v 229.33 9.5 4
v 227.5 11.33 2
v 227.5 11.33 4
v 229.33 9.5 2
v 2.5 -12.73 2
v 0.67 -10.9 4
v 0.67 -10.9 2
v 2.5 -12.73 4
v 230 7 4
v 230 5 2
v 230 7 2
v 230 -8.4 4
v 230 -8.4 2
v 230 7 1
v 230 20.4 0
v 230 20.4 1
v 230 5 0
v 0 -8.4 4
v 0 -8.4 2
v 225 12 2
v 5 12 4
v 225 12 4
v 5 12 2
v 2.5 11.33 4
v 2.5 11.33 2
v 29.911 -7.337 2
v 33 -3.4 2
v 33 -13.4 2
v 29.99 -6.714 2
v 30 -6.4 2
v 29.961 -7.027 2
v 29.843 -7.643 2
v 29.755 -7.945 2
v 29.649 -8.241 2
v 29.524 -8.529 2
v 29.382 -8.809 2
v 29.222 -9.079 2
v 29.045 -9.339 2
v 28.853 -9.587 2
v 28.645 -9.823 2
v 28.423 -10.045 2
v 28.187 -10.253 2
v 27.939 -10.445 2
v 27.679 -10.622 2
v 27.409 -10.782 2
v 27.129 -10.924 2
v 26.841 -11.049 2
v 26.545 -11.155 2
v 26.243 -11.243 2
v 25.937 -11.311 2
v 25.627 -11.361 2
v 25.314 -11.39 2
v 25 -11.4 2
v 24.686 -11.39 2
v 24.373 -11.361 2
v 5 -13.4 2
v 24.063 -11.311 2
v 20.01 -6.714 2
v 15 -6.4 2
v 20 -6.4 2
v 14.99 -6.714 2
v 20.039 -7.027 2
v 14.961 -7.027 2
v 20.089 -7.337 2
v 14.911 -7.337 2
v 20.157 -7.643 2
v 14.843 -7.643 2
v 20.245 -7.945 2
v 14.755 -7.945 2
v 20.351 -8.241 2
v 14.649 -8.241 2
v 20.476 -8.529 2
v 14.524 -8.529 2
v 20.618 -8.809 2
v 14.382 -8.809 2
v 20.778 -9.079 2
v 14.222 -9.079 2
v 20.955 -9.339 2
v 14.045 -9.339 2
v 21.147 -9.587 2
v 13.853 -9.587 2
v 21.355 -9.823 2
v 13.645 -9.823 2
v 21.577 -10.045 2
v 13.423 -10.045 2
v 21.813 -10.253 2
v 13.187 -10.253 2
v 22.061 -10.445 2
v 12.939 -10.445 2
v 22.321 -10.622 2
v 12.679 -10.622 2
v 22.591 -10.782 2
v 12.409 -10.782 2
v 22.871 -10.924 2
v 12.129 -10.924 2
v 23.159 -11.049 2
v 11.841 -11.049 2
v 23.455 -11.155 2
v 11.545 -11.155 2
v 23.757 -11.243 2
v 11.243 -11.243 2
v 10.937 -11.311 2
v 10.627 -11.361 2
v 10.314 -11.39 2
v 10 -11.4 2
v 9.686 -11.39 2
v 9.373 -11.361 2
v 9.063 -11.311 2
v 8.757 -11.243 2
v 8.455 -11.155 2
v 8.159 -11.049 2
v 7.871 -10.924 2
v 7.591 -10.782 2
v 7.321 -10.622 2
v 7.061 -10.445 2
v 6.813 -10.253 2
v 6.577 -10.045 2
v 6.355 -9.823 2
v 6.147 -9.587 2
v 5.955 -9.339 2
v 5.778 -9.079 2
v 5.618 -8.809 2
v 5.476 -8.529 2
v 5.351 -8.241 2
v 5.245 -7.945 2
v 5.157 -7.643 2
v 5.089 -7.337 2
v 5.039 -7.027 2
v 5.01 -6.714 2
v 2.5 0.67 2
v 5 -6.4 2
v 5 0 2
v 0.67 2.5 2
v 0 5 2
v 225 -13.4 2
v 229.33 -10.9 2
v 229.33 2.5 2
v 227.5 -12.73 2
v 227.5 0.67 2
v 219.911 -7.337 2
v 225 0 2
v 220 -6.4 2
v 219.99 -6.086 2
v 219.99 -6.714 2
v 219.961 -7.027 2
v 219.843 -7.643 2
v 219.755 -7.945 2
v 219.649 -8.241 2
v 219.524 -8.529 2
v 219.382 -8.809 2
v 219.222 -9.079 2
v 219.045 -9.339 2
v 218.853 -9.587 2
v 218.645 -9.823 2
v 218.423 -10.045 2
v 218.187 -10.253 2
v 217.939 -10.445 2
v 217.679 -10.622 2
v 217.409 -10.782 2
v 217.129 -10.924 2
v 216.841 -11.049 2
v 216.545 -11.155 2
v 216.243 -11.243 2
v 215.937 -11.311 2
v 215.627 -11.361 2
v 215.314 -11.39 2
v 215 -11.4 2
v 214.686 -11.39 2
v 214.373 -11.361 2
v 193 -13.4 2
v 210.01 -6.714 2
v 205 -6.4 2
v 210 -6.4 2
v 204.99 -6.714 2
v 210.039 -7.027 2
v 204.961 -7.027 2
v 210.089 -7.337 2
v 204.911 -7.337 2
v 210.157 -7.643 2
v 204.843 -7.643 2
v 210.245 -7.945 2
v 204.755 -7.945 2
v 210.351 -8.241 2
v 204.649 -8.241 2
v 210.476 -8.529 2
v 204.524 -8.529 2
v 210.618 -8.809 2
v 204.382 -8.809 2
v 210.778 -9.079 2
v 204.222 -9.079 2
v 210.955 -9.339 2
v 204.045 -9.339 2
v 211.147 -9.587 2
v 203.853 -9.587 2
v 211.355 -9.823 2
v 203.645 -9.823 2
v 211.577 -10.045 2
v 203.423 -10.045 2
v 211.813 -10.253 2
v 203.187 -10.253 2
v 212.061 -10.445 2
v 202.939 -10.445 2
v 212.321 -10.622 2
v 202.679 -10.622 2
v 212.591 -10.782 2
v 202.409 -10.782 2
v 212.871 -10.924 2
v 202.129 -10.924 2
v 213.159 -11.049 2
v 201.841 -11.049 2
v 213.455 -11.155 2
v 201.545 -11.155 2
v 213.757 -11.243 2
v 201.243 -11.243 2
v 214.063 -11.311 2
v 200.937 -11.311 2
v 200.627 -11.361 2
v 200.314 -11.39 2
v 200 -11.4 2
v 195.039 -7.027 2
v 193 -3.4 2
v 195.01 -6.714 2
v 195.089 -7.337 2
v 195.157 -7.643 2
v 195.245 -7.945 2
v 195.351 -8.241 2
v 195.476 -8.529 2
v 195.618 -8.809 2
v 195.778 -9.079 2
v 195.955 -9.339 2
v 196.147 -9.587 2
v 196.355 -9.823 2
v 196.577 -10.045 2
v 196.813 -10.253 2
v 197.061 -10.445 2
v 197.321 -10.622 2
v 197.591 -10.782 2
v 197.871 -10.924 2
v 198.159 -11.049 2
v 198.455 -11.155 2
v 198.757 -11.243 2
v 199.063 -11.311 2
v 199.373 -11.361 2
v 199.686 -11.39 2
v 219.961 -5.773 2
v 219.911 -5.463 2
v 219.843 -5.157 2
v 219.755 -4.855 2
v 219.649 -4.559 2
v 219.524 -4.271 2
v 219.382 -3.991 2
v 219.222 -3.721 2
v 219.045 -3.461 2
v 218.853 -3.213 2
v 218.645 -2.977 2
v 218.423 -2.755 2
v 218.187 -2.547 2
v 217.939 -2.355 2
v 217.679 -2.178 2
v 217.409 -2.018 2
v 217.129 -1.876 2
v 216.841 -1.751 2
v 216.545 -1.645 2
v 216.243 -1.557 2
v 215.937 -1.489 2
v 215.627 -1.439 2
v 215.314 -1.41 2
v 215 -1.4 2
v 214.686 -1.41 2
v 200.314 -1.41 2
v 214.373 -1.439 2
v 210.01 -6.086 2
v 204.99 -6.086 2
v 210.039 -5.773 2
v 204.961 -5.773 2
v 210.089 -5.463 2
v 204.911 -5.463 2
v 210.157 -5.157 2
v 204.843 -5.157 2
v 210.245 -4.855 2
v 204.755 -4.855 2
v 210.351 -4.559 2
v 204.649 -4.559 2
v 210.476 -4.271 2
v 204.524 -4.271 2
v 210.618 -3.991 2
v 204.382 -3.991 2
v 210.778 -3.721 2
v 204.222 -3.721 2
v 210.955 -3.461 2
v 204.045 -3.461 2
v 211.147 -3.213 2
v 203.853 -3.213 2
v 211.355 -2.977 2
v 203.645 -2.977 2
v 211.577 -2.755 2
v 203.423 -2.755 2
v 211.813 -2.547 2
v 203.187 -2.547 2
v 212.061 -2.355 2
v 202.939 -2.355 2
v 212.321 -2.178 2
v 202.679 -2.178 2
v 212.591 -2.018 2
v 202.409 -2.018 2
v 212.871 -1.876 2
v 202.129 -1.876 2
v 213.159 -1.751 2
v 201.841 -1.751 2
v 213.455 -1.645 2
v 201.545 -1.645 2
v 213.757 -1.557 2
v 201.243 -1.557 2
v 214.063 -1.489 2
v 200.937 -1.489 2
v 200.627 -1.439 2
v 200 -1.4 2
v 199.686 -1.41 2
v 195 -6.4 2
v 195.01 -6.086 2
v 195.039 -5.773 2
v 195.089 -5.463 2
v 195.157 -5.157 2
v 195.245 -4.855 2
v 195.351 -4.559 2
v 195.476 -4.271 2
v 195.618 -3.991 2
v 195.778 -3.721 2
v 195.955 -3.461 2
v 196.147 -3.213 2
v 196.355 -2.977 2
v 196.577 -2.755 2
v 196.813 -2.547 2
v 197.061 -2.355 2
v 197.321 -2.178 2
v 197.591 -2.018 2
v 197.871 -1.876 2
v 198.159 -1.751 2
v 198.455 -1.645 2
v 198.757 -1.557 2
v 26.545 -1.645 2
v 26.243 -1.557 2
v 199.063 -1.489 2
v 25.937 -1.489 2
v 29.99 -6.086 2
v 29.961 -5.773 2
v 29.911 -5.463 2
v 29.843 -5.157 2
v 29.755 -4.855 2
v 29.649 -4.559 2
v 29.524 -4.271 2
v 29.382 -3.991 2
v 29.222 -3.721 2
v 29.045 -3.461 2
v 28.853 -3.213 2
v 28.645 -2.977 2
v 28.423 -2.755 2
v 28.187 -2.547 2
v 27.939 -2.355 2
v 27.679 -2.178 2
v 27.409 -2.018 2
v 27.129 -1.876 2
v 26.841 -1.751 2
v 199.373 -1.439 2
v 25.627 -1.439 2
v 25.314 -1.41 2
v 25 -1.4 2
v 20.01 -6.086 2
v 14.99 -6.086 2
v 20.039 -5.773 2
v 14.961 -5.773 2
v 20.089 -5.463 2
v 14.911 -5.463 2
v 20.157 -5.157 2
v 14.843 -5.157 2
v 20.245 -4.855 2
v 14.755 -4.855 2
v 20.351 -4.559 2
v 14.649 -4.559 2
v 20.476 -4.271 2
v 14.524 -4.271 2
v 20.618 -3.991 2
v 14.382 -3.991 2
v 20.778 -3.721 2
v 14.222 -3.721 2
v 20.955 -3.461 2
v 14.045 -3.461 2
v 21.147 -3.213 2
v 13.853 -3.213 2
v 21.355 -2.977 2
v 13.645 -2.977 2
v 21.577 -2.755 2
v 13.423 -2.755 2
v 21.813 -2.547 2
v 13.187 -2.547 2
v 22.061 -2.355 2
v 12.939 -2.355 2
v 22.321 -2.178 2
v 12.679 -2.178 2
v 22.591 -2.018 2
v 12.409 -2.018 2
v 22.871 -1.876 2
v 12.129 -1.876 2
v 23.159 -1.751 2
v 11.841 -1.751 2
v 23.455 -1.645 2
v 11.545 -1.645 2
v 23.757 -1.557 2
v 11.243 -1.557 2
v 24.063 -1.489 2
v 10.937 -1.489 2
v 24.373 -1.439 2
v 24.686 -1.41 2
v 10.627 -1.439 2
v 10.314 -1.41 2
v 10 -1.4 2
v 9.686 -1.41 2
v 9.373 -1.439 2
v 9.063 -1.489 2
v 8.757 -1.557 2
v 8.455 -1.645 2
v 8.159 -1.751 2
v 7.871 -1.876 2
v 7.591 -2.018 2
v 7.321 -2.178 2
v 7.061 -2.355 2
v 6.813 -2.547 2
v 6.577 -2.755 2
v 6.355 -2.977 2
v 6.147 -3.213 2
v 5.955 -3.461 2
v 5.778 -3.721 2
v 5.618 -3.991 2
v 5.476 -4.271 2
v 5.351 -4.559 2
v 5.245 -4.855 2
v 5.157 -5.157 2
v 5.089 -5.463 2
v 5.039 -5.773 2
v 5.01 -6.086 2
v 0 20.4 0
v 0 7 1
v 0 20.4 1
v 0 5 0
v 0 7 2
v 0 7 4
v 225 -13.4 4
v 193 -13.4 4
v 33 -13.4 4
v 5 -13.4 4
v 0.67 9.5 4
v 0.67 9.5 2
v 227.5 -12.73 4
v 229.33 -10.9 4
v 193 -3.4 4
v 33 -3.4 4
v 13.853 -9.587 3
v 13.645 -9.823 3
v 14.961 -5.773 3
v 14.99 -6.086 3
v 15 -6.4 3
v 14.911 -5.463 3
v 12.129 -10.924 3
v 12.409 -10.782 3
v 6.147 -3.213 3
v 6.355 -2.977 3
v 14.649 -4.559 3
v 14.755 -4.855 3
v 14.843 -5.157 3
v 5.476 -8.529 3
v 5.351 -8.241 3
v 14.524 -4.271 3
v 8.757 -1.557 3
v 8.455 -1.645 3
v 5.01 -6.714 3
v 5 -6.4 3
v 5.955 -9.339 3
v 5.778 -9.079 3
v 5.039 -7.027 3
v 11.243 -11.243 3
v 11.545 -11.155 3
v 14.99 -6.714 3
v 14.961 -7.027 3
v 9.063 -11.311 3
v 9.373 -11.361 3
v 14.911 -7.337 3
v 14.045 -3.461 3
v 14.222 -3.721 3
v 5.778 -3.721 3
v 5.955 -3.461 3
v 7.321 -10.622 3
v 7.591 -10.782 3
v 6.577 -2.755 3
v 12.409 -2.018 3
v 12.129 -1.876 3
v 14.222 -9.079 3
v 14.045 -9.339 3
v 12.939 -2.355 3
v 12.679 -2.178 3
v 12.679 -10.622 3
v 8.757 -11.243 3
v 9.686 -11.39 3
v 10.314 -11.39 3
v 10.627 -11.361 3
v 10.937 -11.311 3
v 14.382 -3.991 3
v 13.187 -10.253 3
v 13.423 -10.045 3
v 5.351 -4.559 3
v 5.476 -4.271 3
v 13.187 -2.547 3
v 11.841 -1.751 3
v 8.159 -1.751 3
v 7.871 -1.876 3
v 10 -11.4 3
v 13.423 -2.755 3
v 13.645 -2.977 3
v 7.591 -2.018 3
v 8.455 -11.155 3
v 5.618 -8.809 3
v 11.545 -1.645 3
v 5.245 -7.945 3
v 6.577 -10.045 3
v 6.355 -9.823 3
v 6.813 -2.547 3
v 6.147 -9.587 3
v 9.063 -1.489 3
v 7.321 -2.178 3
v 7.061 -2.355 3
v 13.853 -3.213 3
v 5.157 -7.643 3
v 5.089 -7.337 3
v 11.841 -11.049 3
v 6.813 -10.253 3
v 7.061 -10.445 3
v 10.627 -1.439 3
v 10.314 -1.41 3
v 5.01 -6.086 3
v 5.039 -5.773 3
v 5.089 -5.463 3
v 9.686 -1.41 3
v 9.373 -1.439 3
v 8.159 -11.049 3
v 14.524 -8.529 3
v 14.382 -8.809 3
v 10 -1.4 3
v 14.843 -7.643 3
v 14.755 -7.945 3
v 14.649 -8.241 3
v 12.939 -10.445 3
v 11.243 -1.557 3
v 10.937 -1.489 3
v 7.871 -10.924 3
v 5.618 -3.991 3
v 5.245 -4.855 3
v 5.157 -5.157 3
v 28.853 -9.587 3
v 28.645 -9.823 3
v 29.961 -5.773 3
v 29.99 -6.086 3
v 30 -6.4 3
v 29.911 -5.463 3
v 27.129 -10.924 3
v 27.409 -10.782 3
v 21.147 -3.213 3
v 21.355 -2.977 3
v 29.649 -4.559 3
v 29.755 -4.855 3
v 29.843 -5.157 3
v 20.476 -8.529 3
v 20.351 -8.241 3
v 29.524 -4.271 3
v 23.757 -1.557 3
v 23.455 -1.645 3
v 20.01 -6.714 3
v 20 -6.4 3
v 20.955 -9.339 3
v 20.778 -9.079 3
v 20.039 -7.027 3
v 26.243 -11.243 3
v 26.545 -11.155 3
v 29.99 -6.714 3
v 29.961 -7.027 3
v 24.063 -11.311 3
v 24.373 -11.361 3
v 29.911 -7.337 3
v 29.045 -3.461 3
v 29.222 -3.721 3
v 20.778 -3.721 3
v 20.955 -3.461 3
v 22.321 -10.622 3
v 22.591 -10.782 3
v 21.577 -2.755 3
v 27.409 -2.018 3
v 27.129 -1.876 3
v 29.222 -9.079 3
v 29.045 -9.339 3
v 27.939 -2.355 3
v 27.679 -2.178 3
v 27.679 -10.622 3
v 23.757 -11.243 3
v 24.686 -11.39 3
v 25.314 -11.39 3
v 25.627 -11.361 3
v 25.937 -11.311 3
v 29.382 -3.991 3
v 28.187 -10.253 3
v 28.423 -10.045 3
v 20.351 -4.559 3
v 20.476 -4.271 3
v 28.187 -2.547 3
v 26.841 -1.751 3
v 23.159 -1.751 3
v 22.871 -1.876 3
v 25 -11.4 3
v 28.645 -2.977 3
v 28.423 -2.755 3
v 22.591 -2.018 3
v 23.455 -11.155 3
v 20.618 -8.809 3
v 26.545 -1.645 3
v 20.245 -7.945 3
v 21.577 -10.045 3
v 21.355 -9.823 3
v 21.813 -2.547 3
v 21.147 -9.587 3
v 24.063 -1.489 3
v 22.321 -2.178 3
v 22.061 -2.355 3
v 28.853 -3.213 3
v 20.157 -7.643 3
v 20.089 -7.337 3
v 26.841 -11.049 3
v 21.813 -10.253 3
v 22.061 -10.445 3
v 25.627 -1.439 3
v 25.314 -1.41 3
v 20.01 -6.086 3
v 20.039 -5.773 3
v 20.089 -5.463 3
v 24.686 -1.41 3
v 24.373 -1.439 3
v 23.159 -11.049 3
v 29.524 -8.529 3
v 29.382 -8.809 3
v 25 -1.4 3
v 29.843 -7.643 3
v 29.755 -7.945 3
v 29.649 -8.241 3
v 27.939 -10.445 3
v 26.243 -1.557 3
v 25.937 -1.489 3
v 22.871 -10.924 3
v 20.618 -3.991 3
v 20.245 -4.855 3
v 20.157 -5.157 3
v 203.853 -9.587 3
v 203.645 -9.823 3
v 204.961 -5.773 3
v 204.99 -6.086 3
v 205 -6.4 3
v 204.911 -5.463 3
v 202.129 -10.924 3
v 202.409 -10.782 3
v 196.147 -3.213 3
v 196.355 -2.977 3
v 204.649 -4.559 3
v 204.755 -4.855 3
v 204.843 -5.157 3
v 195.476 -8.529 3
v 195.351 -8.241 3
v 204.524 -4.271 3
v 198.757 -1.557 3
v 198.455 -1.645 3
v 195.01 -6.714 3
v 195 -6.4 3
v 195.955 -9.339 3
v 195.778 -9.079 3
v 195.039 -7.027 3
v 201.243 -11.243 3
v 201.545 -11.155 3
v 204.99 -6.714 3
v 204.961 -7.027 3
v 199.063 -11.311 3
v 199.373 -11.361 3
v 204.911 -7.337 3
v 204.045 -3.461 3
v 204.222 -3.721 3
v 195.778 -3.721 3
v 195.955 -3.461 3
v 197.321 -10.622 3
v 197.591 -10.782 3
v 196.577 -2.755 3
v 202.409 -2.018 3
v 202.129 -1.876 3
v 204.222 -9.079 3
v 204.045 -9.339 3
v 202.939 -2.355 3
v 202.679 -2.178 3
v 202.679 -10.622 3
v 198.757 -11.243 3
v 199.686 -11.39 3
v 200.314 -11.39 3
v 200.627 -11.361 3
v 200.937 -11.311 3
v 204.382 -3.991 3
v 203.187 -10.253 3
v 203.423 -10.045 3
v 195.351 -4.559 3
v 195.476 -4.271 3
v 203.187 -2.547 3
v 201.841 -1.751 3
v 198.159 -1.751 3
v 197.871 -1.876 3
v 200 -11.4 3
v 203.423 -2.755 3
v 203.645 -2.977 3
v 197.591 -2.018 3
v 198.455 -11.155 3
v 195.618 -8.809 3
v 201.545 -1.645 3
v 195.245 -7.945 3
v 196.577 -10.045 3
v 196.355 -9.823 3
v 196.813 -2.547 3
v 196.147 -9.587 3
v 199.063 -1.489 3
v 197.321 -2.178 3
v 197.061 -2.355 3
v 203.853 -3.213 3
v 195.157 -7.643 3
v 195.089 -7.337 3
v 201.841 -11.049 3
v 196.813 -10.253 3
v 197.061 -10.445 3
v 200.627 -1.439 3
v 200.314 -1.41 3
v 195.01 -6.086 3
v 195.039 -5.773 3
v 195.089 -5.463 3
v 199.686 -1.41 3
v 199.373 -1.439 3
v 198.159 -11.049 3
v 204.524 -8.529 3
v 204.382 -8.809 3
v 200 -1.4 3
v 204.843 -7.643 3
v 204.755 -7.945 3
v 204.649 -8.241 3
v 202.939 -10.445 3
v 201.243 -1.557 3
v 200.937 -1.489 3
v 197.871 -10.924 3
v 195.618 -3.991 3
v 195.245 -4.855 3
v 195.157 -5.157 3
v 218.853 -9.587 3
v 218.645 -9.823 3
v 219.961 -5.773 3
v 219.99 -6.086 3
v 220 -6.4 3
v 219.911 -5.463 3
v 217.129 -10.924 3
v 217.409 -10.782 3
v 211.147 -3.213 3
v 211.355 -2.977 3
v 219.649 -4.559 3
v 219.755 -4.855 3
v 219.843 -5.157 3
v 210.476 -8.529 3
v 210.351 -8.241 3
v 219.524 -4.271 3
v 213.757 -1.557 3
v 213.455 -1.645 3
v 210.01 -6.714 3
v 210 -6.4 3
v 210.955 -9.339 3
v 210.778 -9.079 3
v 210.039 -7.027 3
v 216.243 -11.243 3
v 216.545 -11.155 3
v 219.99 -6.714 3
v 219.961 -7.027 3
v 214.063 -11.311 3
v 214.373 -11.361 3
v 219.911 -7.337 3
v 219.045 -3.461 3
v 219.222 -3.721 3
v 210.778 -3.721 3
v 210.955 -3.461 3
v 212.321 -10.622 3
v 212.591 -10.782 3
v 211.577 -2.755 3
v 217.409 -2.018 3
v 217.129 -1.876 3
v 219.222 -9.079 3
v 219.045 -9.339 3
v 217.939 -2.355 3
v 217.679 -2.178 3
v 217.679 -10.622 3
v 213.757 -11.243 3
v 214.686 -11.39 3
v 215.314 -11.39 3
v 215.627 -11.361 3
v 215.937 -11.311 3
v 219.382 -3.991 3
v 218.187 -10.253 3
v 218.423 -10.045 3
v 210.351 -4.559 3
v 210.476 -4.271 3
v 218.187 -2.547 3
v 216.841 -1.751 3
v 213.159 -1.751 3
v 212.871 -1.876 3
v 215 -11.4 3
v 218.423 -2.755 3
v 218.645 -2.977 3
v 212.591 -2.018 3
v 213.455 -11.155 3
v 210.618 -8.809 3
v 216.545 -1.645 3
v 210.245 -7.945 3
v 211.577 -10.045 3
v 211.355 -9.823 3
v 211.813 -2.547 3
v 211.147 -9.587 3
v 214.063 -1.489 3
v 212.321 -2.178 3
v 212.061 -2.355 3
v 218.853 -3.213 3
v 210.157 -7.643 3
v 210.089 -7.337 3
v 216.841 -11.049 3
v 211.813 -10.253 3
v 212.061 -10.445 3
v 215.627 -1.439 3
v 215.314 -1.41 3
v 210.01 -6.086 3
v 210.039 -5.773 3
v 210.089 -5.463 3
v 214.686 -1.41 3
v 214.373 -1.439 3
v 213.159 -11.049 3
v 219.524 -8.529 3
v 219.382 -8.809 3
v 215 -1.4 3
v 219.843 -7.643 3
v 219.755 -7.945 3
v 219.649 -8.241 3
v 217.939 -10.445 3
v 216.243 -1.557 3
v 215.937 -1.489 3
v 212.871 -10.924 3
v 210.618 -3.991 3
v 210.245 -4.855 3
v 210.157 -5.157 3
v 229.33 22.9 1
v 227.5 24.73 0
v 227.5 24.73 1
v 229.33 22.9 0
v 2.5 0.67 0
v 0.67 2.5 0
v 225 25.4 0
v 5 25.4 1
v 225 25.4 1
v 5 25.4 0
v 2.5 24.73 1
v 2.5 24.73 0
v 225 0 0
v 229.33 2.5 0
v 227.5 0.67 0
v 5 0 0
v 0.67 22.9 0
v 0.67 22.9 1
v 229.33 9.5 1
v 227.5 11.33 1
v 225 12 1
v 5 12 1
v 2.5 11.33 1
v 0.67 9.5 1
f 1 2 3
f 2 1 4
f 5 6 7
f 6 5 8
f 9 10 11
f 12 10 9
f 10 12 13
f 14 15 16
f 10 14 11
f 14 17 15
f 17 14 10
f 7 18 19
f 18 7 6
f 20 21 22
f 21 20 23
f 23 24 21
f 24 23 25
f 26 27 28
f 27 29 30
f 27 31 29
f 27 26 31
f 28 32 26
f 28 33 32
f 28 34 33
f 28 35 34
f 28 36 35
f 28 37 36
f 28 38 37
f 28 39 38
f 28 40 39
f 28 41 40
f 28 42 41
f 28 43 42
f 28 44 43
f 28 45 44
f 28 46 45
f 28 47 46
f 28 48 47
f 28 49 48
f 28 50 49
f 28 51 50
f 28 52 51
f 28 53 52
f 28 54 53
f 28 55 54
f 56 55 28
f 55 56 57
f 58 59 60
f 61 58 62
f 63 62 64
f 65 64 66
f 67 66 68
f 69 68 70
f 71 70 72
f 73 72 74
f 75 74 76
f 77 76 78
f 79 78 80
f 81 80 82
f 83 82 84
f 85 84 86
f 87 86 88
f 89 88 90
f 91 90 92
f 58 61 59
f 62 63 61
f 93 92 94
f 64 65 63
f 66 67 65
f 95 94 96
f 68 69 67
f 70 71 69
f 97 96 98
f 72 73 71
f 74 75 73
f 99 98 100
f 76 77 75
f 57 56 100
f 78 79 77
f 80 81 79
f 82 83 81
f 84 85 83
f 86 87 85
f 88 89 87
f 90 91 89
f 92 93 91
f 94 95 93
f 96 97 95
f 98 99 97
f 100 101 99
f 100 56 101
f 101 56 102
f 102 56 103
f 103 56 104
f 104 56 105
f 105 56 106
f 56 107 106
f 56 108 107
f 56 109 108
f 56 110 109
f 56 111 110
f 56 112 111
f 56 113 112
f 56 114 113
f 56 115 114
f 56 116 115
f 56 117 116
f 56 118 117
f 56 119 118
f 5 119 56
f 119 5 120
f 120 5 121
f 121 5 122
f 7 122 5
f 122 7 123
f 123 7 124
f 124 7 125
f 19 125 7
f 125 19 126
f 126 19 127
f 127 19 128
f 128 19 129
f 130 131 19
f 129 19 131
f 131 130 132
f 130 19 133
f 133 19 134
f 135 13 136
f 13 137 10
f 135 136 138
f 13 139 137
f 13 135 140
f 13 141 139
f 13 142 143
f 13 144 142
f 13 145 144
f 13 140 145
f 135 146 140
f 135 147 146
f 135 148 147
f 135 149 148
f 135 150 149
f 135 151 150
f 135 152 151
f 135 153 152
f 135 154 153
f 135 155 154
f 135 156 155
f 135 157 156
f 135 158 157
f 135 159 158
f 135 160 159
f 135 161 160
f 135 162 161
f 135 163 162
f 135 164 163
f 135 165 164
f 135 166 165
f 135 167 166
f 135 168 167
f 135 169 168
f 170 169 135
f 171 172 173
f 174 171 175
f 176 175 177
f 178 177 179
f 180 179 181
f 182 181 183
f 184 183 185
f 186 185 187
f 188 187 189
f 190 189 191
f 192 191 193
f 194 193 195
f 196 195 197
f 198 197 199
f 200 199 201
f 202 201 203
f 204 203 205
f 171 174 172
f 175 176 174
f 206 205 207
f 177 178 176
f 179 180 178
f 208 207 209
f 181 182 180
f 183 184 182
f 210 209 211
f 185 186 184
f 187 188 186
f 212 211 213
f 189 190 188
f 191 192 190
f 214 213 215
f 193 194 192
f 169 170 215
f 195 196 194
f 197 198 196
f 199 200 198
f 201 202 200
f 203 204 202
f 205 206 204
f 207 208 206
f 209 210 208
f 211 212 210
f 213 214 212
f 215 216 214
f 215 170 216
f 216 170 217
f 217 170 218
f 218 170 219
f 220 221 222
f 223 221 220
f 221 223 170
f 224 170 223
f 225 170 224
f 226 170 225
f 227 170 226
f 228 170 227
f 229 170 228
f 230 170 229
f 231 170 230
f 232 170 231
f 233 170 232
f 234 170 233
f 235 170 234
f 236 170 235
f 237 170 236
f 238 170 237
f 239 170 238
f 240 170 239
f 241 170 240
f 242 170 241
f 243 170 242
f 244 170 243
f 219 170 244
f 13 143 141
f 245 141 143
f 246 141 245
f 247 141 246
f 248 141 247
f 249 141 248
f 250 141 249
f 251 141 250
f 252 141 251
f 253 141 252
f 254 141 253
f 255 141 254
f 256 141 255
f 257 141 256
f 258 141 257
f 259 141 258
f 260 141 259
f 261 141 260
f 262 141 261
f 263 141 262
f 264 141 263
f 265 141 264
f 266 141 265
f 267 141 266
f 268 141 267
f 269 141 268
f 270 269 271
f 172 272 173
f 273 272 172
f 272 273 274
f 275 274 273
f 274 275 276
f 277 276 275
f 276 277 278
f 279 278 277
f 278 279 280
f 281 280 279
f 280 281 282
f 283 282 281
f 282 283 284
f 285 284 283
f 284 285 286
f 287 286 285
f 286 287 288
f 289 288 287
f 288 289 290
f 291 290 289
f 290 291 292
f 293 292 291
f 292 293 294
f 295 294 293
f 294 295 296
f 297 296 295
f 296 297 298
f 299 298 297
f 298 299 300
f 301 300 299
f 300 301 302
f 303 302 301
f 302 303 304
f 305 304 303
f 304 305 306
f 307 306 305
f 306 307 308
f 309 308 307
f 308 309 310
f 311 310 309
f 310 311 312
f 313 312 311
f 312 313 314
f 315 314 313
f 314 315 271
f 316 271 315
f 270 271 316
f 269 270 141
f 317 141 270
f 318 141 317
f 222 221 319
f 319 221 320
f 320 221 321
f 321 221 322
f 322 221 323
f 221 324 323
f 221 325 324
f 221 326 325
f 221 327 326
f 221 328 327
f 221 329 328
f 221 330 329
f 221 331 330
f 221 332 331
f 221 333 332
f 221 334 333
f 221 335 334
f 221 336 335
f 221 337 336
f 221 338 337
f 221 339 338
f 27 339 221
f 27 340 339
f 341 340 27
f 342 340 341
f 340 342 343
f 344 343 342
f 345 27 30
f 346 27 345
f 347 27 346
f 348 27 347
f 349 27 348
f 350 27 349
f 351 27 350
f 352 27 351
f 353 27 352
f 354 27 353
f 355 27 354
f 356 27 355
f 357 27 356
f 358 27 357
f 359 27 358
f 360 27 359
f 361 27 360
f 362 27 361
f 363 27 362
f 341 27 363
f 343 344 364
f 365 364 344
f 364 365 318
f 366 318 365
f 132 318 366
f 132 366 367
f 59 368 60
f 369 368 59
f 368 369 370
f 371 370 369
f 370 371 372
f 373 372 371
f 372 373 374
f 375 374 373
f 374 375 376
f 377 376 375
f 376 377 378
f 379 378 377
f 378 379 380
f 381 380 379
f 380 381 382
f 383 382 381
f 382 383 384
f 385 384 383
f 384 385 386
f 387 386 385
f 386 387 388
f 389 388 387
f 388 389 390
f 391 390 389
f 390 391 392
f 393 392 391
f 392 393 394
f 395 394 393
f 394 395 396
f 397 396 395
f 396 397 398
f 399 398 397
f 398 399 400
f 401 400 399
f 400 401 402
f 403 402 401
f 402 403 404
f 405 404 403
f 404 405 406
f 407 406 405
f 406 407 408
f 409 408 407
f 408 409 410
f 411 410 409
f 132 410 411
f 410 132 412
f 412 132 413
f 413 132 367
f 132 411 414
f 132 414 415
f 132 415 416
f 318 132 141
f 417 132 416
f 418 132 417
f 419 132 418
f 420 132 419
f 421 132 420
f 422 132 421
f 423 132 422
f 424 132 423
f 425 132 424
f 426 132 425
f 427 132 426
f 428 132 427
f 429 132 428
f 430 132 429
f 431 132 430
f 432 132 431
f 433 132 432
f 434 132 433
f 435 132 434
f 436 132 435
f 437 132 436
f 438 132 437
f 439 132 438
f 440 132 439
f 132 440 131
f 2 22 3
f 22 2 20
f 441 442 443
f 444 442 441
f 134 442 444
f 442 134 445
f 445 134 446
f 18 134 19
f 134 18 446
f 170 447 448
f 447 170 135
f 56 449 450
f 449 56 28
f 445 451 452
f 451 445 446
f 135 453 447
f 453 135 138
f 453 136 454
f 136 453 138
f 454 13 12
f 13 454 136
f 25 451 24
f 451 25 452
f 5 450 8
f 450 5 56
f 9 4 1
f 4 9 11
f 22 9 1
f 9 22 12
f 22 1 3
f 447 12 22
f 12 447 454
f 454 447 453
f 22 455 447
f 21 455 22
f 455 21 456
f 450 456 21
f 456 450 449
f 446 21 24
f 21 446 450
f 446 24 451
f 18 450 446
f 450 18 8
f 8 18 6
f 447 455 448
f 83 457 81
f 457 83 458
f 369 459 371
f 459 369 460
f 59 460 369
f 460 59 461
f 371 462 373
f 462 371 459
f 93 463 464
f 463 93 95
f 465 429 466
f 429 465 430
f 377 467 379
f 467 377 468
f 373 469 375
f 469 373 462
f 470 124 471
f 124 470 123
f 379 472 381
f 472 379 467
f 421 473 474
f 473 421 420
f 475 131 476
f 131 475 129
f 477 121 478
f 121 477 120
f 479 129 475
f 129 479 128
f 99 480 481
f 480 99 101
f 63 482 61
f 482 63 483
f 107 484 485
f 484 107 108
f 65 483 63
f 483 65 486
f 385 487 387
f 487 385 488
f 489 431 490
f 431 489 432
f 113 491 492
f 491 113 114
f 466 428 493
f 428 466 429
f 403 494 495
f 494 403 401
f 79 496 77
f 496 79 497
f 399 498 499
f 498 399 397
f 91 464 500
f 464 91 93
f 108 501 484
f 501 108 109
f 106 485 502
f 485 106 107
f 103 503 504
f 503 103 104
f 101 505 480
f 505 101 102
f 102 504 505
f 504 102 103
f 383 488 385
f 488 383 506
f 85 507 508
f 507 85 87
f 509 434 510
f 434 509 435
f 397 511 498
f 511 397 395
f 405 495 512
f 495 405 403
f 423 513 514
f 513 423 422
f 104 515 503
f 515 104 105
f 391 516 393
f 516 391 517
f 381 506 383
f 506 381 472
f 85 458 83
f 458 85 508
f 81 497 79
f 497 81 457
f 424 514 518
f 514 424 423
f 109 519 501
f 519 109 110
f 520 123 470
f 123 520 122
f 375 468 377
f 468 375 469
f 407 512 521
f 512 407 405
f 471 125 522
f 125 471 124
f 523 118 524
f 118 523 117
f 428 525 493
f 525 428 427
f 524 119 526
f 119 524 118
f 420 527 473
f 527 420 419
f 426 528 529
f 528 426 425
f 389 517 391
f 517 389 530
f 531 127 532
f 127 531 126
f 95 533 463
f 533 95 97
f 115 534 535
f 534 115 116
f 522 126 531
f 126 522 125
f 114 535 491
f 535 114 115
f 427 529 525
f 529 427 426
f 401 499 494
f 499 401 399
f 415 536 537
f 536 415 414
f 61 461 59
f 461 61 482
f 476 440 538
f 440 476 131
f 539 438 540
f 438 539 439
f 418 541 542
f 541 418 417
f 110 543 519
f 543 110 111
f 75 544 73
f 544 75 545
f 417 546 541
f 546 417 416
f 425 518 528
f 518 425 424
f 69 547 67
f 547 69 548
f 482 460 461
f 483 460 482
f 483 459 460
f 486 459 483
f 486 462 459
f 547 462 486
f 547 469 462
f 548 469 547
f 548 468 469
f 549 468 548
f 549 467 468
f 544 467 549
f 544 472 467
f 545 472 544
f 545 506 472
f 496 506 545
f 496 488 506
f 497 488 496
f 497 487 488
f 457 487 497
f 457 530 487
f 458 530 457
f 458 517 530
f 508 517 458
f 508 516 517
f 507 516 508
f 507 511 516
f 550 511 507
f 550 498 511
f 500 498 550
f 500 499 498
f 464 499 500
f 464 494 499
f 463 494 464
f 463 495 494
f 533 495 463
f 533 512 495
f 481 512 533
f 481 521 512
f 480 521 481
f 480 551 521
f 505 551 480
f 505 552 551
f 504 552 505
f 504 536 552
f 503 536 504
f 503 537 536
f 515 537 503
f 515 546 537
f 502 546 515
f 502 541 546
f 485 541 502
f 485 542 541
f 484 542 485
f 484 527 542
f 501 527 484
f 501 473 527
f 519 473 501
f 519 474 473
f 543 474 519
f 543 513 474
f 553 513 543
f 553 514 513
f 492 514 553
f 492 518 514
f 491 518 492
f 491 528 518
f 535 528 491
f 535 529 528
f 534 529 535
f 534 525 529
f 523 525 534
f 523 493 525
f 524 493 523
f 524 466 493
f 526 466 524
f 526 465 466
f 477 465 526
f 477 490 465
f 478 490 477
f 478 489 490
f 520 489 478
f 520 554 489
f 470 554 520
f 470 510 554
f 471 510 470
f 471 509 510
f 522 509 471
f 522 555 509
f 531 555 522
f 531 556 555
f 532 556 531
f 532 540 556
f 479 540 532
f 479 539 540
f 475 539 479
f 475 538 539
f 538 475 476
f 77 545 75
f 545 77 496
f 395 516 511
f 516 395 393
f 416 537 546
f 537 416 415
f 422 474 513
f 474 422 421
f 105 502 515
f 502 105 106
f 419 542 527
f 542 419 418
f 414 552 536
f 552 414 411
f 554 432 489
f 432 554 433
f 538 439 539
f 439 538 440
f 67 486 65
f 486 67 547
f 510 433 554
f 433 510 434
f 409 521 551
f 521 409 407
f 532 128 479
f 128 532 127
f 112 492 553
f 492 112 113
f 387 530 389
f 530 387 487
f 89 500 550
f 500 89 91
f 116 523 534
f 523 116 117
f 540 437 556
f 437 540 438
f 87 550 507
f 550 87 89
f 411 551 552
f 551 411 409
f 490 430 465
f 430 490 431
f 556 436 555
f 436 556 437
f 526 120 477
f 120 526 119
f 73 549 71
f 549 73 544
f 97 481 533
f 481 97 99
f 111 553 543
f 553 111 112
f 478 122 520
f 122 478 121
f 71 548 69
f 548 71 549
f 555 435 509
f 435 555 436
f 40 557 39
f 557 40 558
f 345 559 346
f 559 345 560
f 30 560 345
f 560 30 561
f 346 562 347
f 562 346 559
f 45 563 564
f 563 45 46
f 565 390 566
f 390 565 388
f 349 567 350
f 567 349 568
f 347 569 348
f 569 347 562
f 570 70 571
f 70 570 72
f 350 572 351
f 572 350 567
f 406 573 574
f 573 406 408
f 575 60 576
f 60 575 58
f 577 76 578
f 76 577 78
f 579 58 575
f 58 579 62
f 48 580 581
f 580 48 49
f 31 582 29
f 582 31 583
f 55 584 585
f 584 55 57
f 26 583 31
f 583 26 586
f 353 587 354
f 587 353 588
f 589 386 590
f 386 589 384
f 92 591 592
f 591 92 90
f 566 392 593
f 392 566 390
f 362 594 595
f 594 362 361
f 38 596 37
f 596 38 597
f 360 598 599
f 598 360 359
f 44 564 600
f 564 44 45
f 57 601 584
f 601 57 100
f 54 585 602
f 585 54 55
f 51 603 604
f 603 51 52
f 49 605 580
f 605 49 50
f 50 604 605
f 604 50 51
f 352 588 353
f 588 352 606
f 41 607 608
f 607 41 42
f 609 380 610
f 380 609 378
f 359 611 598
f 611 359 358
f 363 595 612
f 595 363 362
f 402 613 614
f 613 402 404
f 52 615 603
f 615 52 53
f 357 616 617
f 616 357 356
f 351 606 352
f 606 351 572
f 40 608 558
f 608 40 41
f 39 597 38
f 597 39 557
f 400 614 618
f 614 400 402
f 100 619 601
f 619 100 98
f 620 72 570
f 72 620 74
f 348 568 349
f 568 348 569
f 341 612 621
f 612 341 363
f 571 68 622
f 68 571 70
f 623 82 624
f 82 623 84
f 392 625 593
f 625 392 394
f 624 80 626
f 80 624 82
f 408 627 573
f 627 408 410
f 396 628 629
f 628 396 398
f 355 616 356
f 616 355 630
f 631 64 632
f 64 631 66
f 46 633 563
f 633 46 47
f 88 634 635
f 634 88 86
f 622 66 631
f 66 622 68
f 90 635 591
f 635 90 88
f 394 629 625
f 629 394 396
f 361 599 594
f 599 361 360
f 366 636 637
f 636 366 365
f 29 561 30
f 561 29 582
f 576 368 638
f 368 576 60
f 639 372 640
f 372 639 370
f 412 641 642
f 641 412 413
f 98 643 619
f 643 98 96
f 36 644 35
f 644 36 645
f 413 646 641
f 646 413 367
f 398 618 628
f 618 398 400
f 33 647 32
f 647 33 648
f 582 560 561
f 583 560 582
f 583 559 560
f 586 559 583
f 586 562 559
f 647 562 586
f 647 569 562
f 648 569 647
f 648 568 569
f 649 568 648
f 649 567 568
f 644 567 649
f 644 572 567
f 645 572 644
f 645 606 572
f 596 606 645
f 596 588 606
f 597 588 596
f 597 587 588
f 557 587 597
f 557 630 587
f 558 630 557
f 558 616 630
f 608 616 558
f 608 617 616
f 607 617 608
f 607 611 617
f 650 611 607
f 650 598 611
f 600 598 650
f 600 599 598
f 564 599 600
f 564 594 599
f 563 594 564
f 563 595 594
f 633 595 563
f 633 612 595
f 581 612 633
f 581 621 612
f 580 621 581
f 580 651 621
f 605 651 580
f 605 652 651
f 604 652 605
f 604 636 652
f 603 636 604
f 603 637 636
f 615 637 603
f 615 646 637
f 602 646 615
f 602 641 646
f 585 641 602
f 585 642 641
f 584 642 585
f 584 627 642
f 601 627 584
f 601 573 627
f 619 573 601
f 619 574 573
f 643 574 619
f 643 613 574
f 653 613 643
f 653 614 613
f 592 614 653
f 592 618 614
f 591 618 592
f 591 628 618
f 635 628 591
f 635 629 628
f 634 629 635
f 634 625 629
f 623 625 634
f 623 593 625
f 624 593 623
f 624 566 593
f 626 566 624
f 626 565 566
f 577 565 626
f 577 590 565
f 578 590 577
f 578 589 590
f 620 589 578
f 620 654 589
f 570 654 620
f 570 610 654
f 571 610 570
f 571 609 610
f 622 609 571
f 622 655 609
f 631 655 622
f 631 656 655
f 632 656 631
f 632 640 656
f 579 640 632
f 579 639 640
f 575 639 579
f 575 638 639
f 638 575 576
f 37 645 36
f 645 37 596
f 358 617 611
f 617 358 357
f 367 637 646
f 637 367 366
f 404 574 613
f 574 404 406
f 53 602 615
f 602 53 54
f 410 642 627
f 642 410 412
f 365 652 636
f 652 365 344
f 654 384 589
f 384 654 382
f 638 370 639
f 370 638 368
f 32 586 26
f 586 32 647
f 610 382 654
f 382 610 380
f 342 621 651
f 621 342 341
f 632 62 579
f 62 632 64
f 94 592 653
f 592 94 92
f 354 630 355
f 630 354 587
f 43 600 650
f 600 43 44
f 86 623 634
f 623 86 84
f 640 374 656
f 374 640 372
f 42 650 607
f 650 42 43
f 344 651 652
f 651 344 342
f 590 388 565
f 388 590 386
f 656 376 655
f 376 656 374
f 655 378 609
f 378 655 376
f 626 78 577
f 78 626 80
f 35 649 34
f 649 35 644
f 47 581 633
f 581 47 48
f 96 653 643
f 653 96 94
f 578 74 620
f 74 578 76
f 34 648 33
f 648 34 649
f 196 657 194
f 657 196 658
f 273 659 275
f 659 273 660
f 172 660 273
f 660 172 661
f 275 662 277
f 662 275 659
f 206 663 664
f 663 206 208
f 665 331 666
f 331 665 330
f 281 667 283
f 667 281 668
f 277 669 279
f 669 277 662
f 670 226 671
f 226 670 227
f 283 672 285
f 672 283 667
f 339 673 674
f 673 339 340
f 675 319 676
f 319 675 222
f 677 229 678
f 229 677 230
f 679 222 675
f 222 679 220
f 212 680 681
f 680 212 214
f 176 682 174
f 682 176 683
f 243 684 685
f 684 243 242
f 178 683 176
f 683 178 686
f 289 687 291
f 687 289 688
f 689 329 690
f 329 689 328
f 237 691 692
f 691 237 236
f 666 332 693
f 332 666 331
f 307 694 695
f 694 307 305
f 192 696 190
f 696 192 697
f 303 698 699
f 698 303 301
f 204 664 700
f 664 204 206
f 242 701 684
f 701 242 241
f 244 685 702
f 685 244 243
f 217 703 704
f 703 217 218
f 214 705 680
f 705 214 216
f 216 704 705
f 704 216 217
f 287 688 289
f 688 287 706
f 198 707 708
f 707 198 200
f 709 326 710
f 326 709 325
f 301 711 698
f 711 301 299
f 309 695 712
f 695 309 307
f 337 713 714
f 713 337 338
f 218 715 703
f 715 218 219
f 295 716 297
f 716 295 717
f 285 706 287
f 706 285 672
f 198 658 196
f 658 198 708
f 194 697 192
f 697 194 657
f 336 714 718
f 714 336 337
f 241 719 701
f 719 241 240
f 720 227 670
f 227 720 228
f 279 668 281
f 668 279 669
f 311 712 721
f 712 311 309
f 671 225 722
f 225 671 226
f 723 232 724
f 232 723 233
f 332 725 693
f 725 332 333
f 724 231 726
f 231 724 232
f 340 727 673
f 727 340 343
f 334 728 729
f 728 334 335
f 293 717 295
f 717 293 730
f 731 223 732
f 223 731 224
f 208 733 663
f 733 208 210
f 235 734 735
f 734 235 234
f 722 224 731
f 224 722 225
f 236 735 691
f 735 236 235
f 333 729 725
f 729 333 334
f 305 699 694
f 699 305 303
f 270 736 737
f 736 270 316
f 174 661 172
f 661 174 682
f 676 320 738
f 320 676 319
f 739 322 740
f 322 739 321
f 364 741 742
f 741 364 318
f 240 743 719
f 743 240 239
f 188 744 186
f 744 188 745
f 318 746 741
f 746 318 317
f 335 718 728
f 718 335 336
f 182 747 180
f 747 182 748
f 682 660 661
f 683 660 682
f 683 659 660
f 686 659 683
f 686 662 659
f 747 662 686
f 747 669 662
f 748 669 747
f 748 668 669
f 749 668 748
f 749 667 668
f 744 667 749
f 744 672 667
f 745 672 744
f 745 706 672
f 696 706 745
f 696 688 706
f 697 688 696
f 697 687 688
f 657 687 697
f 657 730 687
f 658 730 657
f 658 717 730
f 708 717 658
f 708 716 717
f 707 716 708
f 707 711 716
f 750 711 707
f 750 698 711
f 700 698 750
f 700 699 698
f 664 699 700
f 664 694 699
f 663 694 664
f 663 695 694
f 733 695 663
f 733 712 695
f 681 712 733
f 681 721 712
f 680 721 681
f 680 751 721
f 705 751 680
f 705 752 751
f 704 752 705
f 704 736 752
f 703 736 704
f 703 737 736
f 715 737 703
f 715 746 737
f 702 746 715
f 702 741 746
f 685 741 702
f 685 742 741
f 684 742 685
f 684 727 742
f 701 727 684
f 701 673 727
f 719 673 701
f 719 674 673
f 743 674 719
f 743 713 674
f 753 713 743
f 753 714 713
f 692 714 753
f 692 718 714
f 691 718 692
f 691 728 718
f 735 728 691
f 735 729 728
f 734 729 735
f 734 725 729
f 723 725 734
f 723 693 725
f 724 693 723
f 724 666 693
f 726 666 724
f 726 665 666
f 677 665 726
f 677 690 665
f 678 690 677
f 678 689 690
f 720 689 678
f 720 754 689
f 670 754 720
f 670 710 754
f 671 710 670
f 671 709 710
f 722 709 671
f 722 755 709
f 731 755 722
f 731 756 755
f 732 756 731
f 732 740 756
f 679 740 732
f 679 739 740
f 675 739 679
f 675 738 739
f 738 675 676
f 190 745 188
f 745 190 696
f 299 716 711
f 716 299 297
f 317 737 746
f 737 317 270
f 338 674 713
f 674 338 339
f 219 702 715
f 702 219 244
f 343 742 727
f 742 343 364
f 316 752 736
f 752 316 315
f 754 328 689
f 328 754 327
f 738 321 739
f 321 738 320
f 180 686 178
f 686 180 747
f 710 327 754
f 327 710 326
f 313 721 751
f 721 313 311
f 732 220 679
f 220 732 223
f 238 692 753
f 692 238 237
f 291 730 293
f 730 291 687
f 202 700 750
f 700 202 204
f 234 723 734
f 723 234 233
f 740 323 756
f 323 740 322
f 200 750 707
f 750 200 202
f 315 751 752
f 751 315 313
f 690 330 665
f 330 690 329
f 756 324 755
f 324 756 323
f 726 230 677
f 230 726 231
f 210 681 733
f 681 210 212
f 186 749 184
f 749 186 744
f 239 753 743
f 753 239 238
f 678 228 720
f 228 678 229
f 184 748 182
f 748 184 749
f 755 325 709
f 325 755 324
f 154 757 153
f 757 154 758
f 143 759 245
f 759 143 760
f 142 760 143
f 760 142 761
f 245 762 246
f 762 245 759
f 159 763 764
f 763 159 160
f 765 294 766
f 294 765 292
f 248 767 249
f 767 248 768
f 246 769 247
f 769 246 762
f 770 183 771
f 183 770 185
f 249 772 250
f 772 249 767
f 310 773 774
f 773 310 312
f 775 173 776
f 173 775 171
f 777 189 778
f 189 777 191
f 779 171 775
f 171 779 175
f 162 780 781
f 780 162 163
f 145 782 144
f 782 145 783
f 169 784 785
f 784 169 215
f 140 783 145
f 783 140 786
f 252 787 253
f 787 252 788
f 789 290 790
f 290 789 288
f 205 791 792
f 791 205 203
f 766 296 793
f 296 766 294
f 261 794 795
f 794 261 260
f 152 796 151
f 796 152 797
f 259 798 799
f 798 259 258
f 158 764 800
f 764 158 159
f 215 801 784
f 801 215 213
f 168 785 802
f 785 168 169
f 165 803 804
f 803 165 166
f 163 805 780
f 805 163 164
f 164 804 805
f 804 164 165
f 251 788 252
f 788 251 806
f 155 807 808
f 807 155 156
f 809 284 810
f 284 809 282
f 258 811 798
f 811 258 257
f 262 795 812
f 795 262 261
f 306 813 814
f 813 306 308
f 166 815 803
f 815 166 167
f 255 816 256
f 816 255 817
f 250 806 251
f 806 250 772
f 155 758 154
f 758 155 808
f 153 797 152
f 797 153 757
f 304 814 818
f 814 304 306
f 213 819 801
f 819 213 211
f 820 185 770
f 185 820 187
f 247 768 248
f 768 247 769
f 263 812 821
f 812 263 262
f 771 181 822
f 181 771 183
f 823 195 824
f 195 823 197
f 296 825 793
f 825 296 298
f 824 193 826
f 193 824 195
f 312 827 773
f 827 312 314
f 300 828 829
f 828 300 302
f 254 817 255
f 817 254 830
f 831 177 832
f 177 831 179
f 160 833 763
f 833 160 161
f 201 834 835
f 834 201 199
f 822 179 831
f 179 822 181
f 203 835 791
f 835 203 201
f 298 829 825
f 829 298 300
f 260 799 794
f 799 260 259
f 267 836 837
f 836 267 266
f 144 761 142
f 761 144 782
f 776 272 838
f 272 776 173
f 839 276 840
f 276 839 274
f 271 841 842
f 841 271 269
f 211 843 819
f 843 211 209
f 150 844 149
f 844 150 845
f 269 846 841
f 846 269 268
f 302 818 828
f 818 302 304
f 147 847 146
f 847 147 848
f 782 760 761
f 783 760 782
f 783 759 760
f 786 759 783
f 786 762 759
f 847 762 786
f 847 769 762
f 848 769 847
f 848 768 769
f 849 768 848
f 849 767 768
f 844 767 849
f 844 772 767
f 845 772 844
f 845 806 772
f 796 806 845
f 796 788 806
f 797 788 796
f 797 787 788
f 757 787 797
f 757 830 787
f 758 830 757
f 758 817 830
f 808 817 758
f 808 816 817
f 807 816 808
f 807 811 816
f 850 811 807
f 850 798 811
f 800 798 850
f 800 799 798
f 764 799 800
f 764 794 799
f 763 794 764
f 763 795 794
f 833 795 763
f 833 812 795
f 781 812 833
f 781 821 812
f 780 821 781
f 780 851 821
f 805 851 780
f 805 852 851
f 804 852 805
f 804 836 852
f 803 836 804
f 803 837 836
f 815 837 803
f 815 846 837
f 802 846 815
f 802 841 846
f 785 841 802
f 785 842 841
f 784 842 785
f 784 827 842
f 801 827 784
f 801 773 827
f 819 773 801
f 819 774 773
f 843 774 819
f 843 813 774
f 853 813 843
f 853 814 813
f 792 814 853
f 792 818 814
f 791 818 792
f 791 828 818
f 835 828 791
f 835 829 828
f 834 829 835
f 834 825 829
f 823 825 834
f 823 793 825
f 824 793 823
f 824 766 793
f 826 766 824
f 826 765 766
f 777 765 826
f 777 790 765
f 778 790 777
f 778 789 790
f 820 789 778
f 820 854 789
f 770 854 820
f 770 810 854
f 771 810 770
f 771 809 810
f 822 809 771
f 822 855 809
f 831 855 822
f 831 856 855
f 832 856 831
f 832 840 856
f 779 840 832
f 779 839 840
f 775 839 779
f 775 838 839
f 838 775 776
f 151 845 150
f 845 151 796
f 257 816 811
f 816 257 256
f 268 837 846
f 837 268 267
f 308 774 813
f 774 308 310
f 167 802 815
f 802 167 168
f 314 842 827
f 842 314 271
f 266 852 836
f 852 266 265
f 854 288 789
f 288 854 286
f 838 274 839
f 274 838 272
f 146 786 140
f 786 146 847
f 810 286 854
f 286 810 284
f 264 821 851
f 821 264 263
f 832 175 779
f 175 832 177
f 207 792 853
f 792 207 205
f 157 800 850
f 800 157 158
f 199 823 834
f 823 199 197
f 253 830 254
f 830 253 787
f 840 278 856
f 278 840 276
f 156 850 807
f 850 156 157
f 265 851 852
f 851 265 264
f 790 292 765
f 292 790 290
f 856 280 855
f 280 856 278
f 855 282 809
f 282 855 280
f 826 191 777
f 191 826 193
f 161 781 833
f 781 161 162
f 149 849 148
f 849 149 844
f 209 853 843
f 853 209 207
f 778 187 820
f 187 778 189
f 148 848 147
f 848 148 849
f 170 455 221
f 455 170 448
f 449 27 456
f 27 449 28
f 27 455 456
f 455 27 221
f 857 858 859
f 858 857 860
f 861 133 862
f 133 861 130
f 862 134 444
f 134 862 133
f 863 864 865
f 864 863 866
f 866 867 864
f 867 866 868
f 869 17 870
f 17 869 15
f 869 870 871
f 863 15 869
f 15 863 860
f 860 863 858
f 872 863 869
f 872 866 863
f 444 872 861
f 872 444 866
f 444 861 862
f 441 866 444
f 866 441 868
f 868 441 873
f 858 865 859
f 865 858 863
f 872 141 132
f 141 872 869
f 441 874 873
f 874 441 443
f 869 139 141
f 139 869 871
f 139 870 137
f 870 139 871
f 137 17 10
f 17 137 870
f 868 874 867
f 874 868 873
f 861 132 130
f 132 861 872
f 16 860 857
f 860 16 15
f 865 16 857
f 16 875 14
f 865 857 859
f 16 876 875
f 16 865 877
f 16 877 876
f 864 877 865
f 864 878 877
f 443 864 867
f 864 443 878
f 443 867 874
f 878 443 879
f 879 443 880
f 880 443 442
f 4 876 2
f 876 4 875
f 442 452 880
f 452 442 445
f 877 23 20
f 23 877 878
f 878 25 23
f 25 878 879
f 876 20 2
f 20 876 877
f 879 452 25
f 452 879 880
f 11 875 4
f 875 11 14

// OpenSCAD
// [FL_INDEX: keywords="openscad, 3d_parametric, Its_a_thing_to_hold_on_keyguards, csg_solid" | COT="Parametric OpenSCAD design from 3DCodeverse"]
// Title: Its a thing to hold on keyguards

$fn = 100;
// The height of the Acrylic used for the keyguard
acrylicHeight = 3;

roundedRect([230, 25.4, 1], 5, $fn=12);
roundedRect([230, 12, acrylicHeight-1], 5, $fn=12);

translate([0,-13.4,acrylicHeight-1]){
	difference(){
    difference(){
        roundedRect([230, 25.4, 2], 5, $fn=12);
        translate ([10,7,-1]){
            cylinder(h=2,r=5);
        }
        translate ([25,7,-1]){
            cylinder(h=2,r=5);
        }

	   translate ([200,7,-1]){
            cylinder(h=2,r=5);
        }
        translate ([215,7,-1]){
            cylinder(h=2,r=5);
        }
    }
	translate([33,0,0]) cube([160, 10, 3]);
}

}




module roundedRect(size, radius) {
x = size[0];
y = size[1];
z = size[2];

linear_extrude(height=z)
hull() {
translate([radius, radius, 0])
circle(r=radius);

translate([x - radius, radius, 0])
circle(r=radius);

translate([x - radius, y - radius, 0])
circle(r=radius);

translate([radius, y - radius, 0])
circle(r=radius);
}
}
